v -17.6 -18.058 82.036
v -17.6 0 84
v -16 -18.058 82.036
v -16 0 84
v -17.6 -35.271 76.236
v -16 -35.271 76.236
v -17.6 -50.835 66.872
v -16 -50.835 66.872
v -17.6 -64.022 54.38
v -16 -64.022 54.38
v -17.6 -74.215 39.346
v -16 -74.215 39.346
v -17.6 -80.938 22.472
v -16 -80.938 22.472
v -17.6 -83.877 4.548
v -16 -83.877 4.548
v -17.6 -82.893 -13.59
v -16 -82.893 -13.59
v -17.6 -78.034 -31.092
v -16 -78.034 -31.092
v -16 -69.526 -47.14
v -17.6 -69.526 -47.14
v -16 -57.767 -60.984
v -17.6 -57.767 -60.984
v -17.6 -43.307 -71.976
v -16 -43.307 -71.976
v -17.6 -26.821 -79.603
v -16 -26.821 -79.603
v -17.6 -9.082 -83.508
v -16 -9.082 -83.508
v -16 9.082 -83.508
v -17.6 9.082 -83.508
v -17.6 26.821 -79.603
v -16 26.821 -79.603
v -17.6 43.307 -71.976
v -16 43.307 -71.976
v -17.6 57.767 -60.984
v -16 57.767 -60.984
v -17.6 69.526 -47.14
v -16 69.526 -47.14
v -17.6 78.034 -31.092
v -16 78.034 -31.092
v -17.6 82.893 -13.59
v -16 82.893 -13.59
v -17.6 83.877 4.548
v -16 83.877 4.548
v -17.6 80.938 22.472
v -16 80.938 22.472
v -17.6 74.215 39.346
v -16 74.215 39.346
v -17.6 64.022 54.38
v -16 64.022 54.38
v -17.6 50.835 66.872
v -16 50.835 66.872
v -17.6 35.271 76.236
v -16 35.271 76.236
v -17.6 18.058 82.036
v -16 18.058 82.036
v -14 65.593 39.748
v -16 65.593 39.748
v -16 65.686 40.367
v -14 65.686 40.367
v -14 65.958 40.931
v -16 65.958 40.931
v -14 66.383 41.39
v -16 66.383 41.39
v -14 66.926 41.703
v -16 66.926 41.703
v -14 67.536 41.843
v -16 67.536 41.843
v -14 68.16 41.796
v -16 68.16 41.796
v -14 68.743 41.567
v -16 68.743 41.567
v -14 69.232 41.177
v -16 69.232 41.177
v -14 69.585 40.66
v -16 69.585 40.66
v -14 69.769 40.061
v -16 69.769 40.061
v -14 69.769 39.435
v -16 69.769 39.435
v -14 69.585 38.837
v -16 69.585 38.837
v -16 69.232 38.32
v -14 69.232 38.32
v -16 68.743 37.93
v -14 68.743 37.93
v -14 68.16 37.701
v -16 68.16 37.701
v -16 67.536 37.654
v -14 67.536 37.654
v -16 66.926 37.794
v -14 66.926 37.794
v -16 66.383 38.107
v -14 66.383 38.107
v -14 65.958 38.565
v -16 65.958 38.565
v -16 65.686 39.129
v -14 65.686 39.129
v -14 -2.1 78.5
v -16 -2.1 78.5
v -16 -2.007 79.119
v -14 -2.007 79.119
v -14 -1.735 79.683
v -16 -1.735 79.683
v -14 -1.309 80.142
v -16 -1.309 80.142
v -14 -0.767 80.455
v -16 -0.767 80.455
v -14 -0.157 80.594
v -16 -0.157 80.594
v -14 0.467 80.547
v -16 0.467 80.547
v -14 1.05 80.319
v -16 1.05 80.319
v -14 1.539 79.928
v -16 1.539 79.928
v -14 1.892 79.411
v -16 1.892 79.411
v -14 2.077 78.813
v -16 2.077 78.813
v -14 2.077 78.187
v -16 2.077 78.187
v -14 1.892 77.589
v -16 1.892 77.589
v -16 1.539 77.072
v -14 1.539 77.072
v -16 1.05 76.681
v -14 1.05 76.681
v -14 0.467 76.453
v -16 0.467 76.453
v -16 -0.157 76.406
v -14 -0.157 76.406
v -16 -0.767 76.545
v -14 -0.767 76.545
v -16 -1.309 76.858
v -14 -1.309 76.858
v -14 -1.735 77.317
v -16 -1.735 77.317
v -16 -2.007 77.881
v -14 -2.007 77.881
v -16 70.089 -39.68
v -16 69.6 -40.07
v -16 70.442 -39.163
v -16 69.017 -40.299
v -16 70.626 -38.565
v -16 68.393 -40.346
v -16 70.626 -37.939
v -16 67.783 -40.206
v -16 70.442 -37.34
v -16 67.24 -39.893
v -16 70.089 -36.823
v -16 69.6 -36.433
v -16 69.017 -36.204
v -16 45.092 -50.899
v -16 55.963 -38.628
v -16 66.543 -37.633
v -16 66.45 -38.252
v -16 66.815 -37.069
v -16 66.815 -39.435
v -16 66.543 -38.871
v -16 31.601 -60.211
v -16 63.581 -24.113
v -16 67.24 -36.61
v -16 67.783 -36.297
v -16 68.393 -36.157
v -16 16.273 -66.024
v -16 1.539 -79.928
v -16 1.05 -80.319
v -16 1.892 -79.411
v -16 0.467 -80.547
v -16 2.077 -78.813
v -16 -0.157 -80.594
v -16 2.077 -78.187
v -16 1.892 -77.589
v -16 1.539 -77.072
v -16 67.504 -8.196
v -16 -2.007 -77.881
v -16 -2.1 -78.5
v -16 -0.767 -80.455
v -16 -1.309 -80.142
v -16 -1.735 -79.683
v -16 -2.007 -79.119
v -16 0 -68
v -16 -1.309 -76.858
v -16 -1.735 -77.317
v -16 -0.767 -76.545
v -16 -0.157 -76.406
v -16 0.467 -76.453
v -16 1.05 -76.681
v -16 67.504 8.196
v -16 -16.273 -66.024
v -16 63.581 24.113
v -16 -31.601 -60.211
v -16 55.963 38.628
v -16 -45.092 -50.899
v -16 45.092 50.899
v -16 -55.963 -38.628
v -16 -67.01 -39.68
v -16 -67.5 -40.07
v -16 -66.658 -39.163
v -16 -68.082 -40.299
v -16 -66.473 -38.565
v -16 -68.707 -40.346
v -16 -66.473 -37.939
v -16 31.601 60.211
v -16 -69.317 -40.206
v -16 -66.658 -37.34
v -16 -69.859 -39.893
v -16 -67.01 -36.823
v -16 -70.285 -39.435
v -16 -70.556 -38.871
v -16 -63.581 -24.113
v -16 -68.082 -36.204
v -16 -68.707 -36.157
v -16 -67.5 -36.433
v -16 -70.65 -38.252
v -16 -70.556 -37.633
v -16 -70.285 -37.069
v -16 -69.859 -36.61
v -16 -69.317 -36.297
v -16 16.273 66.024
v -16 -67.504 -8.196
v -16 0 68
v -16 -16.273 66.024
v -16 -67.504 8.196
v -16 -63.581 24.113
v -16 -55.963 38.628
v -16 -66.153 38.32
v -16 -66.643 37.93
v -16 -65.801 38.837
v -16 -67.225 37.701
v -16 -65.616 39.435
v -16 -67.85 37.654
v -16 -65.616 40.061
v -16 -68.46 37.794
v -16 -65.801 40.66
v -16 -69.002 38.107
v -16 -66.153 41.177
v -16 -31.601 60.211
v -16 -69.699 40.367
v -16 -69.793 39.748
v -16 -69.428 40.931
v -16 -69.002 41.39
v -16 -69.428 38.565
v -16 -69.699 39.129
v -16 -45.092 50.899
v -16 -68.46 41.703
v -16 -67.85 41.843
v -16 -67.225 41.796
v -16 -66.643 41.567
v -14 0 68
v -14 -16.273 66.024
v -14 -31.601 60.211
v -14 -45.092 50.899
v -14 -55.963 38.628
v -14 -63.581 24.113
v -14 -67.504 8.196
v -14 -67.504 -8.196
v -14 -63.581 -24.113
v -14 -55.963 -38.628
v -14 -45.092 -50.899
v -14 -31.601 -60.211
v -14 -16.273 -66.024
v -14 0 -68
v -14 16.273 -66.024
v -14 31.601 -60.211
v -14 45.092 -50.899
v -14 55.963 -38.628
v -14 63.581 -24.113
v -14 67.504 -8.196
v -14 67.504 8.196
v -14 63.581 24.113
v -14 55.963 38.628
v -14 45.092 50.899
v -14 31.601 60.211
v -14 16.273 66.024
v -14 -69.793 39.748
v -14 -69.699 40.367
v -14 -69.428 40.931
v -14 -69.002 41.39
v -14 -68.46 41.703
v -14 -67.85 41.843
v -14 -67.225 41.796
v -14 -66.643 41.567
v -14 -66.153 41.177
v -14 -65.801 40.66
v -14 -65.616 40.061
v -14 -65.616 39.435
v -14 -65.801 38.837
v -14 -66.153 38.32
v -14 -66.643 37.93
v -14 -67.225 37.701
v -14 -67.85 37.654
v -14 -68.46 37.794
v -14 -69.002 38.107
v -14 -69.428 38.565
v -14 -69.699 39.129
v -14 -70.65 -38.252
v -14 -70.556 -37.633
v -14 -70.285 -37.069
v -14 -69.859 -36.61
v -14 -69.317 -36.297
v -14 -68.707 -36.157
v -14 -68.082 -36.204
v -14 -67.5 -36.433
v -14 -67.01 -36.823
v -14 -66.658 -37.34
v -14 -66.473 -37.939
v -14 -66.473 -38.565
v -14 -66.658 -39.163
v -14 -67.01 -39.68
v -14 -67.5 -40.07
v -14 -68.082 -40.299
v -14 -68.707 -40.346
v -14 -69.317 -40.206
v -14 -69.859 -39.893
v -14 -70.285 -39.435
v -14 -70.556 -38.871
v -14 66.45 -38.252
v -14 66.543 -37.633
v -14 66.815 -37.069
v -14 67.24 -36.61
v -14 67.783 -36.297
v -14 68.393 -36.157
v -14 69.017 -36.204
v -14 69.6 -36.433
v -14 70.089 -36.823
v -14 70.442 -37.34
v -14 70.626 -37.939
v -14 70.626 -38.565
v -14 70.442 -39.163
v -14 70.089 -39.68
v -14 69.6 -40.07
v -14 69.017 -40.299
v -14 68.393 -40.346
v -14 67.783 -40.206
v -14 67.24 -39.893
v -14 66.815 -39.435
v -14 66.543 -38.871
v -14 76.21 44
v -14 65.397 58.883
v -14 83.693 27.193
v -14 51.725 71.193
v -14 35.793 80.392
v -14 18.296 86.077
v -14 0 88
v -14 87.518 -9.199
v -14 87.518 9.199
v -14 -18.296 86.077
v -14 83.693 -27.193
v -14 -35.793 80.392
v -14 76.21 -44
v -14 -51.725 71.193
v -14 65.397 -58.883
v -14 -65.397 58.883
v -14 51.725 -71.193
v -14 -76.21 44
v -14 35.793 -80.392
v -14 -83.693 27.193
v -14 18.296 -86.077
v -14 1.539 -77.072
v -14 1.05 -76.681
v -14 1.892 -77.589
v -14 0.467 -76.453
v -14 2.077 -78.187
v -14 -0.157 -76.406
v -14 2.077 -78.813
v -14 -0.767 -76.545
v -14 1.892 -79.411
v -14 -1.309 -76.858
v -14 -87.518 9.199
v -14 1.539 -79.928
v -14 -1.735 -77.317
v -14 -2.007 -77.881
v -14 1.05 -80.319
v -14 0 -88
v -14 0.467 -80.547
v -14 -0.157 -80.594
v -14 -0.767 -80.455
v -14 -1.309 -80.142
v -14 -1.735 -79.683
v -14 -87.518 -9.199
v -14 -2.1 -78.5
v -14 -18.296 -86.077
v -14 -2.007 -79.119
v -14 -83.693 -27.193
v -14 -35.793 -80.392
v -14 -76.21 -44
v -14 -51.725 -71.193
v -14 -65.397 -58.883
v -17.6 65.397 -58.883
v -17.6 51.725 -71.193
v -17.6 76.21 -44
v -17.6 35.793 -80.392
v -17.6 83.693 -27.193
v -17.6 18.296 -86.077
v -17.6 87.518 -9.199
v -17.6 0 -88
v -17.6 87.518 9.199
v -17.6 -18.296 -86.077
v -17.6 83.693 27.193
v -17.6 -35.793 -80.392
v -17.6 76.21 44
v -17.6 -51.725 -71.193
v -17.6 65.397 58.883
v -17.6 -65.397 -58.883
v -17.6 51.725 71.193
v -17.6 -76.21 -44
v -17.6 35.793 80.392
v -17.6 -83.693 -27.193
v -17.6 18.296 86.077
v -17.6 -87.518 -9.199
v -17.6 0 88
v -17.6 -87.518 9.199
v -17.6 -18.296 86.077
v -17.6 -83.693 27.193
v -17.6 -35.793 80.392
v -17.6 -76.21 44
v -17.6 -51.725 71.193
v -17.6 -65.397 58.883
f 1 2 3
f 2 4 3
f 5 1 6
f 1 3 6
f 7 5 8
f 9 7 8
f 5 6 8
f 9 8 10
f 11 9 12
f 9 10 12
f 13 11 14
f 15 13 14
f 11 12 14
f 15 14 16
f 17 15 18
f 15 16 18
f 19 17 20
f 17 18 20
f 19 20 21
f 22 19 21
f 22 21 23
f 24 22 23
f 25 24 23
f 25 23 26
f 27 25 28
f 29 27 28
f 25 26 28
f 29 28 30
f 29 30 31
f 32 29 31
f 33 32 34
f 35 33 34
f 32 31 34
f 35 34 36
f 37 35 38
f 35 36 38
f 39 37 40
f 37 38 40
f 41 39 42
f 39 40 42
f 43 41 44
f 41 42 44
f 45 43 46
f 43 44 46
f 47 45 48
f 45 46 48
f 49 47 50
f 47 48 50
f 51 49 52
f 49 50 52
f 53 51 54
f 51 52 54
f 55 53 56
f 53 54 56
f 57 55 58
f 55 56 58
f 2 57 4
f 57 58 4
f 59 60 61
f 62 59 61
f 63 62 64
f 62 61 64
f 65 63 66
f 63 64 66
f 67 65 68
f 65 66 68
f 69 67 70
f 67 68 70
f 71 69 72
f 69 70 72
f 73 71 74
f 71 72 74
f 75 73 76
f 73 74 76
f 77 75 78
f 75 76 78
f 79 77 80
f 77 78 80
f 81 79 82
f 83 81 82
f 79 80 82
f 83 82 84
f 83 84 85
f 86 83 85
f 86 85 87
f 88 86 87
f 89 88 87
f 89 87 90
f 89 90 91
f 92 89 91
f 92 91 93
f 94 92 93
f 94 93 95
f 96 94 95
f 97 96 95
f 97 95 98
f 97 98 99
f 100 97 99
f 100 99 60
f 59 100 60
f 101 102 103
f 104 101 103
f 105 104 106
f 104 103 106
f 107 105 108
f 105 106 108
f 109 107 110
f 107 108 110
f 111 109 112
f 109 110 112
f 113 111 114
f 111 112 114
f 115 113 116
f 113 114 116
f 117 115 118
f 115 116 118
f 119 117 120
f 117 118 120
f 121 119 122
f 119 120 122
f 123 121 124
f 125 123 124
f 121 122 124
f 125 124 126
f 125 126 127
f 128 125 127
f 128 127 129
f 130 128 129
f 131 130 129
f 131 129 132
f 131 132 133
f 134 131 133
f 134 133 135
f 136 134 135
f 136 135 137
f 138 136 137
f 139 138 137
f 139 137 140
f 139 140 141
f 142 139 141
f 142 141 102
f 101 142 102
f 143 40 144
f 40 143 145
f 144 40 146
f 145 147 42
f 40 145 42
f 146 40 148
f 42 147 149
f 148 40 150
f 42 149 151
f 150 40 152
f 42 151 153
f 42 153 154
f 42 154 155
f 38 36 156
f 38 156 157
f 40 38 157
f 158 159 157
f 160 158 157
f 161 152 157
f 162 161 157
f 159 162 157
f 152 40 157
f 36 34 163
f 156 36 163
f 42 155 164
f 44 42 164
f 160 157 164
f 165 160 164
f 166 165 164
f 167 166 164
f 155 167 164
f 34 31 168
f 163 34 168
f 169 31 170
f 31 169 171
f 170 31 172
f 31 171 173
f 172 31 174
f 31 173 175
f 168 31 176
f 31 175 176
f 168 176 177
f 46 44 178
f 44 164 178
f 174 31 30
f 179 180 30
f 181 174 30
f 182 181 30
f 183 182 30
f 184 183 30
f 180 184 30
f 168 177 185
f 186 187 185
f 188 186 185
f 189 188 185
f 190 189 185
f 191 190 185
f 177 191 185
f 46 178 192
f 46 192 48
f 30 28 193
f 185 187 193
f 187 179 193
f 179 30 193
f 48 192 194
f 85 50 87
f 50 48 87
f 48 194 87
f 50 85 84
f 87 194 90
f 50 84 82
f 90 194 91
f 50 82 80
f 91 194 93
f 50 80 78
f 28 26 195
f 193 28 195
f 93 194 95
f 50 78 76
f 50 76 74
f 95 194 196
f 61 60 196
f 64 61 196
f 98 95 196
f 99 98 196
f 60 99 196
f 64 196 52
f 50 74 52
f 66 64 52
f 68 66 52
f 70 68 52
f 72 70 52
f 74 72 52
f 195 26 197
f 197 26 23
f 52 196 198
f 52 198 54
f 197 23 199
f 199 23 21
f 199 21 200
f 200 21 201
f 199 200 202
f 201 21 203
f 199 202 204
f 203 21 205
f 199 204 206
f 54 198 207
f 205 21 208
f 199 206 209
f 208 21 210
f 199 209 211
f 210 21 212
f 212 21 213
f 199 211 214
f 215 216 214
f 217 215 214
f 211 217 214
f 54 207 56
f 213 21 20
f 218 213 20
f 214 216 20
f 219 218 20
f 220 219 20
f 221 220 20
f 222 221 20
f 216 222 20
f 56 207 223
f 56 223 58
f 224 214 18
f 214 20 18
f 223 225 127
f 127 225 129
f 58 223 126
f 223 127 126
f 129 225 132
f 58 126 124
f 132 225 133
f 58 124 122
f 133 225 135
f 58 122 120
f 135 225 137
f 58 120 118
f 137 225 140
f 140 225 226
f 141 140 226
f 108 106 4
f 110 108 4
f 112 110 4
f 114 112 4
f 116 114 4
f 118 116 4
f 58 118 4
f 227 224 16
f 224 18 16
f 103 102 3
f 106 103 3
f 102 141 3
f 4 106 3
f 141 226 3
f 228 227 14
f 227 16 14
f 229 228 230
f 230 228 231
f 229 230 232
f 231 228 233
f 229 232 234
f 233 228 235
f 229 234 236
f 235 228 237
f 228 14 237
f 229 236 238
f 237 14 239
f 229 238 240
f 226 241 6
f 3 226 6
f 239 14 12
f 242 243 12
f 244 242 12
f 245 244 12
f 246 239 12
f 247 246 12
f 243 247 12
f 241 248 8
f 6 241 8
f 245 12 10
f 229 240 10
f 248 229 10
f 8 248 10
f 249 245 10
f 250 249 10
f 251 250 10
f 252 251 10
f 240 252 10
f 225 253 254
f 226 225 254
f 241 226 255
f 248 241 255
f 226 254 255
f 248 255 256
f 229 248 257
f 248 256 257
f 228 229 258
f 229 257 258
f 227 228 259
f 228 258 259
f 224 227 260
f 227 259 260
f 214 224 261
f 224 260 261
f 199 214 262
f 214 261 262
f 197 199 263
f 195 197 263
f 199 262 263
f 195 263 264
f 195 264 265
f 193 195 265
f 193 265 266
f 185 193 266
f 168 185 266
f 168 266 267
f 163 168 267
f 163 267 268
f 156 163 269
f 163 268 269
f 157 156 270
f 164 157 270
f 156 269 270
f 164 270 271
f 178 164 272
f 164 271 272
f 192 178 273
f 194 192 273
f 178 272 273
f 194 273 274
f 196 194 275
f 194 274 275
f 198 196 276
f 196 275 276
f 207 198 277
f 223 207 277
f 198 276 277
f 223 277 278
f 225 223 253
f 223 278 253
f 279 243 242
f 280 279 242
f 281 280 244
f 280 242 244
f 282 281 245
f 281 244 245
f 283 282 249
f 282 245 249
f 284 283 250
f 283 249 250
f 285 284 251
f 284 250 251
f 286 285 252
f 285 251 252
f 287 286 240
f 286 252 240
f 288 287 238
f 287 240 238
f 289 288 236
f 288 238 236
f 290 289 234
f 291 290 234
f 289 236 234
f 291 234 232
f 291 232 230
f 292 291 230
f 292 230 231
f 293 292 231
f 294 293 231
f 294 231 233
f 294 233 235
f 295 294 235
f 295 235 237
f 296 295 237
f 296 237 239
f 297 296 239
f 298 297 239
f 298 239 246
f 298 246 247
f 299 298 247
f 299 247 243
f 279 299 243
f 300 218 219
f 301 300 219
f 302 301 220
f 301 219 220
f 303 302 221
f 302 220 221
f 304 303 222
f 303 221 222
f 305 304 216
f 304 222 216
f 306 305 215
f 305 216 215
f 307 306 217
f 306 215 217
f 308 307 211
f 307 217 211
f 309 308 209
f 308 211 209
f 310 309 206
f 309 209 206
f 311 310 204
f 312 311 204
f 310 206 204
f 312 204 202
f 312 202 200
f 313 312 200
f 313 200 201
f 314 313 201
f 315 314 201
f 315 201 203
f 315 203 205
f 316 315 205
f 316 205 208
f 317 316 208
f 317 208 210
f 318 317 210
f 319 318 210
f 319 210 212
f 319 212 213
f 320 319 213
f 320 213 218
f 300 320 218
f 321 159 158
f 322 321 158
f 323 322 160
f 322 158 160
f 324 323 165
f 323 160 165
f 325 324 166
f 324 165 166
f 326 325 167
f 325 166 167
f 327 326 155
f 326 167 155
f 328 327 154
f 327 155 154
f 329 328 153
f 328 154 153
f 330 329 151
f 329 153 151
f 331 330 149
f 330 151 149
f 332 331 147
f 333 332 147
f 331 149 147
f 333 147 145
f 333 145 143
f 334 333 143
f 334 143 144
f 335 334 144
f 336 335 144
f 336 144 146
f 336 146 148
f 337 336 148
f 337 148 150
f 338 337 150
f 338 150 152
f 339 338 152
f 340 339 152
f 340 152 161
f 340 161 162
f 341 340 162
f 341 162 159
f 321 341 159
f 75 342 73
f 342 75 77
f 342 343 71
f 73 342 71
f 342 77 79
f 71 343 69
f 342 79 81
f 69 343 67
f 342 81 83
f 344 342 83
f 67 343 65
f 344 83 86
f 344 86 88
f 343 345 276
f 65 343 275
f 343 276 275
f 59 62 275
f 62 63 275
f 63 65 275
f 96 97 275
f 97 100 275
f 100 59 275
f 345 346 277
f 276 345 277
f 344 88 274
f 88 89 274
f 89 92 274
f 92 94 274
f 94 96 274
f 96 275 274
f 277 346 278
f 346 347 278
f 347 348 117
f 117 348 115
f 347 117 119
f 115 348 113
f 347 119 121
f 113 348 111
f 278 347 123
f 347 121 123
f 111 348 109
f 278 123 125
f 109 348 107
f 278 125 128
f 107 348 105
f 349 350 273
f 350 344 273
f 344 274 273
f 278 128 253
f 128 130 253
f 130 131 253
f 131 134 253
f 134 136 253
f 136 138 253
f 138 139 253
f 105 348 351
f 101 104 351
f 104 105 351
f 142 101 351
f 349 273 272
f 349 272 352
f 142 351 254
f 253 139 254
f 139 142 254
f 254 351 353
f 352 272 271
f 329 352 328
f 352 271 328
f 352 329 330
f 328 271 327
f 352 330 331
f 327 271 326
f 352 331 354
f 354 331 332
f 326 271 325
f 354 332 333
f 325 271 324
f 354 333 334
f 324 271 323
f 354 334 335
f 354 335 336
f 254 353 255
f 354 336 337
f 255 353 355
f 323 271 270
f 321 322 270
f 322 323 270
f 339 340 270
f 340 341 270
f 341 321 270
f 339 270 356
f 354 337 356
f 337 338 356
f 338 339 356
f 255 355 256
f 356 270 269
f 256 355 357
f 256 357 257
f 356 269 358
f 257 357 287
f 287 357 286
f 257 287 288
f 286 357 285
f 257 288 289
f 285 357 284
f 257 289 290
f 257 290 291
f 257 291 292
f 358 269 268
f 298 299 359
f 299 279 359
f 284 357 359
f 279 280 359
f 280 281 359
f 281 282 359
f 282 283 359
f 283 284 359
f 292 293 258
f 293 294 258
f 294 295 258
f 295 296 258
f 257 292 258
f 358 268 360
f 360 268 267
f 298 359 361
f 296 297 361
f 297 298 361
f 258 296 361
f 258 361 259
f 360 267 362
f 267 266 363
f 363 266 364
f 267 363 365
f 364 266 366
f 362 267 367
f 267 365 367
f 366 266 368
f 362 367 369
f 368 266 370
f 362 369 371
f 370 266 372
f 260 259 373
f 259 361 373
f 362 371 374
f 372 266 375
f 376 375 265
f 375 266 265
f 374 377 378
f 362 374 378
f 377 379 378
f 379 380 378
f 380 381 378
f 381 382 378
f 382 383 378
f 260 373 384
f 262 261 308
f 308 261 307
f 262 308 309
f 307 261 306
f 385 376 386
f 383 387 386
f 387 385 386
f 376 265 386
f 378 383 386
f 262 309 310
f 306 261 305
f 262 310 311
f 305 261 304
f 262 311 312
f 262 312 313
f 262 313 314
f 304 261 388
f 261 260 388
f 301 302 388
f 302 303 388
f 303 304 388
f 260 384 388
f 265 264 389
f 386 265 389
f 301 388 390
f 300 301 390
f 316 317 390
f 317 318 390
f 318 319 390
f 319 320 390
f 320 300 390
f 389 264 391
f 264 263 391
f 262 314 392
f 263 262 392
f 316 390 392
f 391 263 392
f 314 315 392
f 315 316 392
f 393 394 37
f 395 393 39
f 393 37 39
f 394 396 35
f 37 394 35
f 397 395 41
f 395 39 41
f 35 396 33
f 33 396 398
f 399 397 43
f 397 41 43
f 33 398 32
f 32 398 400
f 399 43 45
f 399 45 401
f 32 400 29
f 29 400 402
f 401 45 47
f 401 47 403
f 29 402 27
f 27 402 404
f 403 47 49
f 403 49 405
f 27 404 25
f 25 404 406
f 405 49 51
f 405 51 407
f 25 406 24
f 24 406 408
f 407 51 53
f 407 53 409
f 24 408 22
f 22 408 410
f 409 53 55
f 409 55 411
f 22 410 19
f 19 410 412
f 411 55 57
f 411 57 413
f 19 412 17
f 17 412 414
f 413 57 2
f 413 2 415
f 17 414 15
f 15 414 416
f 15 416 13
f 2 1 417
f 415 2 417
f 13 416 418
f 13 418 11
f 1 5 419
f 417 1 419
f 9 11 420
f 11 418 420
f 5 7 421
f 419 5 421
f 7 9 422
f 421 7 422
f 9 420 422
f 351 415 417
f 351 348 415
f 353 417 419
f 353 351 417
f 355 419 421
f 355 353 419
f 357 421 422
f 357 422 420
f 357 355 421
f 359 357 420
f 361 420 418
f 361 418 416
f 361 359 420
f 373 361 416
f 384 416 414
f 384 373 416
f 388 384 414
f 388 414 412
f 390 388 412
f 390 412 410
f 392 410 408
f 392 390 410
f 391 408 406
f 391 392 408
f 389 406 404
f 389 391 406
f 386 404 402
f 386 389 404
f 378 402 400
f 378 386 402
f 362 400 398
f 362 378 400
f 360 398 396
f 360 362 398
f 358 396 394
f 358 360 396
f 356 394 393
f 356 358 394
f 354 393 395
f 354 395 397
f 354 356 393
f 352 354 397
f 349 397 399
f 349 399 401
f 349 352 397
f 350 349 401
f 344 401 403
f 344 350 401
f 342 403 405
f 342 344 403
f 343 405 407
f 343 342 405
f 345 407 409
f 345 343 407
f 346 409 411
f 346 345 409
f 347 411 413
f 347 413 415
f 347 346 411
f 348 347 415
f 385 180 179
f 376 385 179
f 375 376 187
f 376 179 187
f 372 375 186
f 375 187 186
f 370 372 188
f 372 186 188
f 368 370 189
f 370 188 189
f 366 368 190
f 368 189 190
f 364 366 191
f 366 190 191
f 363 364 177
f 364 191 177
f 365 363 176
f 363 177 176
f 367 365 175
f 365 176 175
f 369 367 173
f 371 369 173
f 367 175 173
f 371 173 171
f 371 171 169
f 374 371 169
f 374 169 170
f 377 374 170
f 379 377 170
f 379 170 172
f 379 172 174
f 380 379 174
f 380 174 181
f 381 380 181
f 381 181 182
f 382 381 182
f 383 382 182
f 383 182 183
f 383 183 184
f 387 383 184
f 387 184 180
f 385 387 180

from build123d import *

# Parameters (mm, degrees)
F2_DEPTH = 0.7
F3_DEPTH = 0.35
F5_D     = 4.2
F6_DEPTH = 1.25
F7_DEPTH = 30


with BuildPart() as f1:
    # F0 (on Front) → F1 (revolve)
    with BuildSketch(Plane.XZ):
        Polygon((-16, 84), (-16, 68), (16, 68), (16, 84), (16.35, 84), (16.35, 88), (-16.35, 88), (-16.35, 84), align=None)
    revolve(axis=Axis((-7.2666932824, 0, 0), (1, 0, 0)))

    # F2 (cut): a face of the model
    f2_faces = [f1.faces().sort_by_distance(p)[0] for p in [
        (16.35, 0, -86.4890158698),
    ]]
    extrude(f2_faces, amount=-F2_DEPTH, mode=Mode.SUBTRACT)

    # F3 (add): a face of the model
    f3_faces = [f1.faces().sort_by_distance(p)[0] for p in [
        (15.65, 0, -86.4890158698),
    ]]
    extrude(f3_faces, amount=F3_DEPTH)

    # F5 (through all)
    with Locations(Plane.YZ.offset(16)):
        with Locations((-67.6927920079, 39.7484076433), (0, 78.5), (67.6927920079, 39.7484076433), (68.5497314523, -38.2515923567), (0, -78.5), (-68.5497314523, -38.2515923567)):
            Hole(F5_D / 2)

    # F6 (add): a face of the model
    f6_faces = [f1.faces().sort_by_distance(p)[0] for p in [
        (-16.35, 0, -85.5109841302),
    ]]
    extrude(f6_faces, amount=F6_DEPTH)

    # F7 (cut): a face of the model
    f7_faces = [f1.faces().sort_by_distance(p)[0] for p in [
        (16, 0, -85.5109841302),
    ]]
    extrude(f7_faces, amount=-F7_DEPTH, mode=Mode.SUBTRACT)


solid = f1.part
